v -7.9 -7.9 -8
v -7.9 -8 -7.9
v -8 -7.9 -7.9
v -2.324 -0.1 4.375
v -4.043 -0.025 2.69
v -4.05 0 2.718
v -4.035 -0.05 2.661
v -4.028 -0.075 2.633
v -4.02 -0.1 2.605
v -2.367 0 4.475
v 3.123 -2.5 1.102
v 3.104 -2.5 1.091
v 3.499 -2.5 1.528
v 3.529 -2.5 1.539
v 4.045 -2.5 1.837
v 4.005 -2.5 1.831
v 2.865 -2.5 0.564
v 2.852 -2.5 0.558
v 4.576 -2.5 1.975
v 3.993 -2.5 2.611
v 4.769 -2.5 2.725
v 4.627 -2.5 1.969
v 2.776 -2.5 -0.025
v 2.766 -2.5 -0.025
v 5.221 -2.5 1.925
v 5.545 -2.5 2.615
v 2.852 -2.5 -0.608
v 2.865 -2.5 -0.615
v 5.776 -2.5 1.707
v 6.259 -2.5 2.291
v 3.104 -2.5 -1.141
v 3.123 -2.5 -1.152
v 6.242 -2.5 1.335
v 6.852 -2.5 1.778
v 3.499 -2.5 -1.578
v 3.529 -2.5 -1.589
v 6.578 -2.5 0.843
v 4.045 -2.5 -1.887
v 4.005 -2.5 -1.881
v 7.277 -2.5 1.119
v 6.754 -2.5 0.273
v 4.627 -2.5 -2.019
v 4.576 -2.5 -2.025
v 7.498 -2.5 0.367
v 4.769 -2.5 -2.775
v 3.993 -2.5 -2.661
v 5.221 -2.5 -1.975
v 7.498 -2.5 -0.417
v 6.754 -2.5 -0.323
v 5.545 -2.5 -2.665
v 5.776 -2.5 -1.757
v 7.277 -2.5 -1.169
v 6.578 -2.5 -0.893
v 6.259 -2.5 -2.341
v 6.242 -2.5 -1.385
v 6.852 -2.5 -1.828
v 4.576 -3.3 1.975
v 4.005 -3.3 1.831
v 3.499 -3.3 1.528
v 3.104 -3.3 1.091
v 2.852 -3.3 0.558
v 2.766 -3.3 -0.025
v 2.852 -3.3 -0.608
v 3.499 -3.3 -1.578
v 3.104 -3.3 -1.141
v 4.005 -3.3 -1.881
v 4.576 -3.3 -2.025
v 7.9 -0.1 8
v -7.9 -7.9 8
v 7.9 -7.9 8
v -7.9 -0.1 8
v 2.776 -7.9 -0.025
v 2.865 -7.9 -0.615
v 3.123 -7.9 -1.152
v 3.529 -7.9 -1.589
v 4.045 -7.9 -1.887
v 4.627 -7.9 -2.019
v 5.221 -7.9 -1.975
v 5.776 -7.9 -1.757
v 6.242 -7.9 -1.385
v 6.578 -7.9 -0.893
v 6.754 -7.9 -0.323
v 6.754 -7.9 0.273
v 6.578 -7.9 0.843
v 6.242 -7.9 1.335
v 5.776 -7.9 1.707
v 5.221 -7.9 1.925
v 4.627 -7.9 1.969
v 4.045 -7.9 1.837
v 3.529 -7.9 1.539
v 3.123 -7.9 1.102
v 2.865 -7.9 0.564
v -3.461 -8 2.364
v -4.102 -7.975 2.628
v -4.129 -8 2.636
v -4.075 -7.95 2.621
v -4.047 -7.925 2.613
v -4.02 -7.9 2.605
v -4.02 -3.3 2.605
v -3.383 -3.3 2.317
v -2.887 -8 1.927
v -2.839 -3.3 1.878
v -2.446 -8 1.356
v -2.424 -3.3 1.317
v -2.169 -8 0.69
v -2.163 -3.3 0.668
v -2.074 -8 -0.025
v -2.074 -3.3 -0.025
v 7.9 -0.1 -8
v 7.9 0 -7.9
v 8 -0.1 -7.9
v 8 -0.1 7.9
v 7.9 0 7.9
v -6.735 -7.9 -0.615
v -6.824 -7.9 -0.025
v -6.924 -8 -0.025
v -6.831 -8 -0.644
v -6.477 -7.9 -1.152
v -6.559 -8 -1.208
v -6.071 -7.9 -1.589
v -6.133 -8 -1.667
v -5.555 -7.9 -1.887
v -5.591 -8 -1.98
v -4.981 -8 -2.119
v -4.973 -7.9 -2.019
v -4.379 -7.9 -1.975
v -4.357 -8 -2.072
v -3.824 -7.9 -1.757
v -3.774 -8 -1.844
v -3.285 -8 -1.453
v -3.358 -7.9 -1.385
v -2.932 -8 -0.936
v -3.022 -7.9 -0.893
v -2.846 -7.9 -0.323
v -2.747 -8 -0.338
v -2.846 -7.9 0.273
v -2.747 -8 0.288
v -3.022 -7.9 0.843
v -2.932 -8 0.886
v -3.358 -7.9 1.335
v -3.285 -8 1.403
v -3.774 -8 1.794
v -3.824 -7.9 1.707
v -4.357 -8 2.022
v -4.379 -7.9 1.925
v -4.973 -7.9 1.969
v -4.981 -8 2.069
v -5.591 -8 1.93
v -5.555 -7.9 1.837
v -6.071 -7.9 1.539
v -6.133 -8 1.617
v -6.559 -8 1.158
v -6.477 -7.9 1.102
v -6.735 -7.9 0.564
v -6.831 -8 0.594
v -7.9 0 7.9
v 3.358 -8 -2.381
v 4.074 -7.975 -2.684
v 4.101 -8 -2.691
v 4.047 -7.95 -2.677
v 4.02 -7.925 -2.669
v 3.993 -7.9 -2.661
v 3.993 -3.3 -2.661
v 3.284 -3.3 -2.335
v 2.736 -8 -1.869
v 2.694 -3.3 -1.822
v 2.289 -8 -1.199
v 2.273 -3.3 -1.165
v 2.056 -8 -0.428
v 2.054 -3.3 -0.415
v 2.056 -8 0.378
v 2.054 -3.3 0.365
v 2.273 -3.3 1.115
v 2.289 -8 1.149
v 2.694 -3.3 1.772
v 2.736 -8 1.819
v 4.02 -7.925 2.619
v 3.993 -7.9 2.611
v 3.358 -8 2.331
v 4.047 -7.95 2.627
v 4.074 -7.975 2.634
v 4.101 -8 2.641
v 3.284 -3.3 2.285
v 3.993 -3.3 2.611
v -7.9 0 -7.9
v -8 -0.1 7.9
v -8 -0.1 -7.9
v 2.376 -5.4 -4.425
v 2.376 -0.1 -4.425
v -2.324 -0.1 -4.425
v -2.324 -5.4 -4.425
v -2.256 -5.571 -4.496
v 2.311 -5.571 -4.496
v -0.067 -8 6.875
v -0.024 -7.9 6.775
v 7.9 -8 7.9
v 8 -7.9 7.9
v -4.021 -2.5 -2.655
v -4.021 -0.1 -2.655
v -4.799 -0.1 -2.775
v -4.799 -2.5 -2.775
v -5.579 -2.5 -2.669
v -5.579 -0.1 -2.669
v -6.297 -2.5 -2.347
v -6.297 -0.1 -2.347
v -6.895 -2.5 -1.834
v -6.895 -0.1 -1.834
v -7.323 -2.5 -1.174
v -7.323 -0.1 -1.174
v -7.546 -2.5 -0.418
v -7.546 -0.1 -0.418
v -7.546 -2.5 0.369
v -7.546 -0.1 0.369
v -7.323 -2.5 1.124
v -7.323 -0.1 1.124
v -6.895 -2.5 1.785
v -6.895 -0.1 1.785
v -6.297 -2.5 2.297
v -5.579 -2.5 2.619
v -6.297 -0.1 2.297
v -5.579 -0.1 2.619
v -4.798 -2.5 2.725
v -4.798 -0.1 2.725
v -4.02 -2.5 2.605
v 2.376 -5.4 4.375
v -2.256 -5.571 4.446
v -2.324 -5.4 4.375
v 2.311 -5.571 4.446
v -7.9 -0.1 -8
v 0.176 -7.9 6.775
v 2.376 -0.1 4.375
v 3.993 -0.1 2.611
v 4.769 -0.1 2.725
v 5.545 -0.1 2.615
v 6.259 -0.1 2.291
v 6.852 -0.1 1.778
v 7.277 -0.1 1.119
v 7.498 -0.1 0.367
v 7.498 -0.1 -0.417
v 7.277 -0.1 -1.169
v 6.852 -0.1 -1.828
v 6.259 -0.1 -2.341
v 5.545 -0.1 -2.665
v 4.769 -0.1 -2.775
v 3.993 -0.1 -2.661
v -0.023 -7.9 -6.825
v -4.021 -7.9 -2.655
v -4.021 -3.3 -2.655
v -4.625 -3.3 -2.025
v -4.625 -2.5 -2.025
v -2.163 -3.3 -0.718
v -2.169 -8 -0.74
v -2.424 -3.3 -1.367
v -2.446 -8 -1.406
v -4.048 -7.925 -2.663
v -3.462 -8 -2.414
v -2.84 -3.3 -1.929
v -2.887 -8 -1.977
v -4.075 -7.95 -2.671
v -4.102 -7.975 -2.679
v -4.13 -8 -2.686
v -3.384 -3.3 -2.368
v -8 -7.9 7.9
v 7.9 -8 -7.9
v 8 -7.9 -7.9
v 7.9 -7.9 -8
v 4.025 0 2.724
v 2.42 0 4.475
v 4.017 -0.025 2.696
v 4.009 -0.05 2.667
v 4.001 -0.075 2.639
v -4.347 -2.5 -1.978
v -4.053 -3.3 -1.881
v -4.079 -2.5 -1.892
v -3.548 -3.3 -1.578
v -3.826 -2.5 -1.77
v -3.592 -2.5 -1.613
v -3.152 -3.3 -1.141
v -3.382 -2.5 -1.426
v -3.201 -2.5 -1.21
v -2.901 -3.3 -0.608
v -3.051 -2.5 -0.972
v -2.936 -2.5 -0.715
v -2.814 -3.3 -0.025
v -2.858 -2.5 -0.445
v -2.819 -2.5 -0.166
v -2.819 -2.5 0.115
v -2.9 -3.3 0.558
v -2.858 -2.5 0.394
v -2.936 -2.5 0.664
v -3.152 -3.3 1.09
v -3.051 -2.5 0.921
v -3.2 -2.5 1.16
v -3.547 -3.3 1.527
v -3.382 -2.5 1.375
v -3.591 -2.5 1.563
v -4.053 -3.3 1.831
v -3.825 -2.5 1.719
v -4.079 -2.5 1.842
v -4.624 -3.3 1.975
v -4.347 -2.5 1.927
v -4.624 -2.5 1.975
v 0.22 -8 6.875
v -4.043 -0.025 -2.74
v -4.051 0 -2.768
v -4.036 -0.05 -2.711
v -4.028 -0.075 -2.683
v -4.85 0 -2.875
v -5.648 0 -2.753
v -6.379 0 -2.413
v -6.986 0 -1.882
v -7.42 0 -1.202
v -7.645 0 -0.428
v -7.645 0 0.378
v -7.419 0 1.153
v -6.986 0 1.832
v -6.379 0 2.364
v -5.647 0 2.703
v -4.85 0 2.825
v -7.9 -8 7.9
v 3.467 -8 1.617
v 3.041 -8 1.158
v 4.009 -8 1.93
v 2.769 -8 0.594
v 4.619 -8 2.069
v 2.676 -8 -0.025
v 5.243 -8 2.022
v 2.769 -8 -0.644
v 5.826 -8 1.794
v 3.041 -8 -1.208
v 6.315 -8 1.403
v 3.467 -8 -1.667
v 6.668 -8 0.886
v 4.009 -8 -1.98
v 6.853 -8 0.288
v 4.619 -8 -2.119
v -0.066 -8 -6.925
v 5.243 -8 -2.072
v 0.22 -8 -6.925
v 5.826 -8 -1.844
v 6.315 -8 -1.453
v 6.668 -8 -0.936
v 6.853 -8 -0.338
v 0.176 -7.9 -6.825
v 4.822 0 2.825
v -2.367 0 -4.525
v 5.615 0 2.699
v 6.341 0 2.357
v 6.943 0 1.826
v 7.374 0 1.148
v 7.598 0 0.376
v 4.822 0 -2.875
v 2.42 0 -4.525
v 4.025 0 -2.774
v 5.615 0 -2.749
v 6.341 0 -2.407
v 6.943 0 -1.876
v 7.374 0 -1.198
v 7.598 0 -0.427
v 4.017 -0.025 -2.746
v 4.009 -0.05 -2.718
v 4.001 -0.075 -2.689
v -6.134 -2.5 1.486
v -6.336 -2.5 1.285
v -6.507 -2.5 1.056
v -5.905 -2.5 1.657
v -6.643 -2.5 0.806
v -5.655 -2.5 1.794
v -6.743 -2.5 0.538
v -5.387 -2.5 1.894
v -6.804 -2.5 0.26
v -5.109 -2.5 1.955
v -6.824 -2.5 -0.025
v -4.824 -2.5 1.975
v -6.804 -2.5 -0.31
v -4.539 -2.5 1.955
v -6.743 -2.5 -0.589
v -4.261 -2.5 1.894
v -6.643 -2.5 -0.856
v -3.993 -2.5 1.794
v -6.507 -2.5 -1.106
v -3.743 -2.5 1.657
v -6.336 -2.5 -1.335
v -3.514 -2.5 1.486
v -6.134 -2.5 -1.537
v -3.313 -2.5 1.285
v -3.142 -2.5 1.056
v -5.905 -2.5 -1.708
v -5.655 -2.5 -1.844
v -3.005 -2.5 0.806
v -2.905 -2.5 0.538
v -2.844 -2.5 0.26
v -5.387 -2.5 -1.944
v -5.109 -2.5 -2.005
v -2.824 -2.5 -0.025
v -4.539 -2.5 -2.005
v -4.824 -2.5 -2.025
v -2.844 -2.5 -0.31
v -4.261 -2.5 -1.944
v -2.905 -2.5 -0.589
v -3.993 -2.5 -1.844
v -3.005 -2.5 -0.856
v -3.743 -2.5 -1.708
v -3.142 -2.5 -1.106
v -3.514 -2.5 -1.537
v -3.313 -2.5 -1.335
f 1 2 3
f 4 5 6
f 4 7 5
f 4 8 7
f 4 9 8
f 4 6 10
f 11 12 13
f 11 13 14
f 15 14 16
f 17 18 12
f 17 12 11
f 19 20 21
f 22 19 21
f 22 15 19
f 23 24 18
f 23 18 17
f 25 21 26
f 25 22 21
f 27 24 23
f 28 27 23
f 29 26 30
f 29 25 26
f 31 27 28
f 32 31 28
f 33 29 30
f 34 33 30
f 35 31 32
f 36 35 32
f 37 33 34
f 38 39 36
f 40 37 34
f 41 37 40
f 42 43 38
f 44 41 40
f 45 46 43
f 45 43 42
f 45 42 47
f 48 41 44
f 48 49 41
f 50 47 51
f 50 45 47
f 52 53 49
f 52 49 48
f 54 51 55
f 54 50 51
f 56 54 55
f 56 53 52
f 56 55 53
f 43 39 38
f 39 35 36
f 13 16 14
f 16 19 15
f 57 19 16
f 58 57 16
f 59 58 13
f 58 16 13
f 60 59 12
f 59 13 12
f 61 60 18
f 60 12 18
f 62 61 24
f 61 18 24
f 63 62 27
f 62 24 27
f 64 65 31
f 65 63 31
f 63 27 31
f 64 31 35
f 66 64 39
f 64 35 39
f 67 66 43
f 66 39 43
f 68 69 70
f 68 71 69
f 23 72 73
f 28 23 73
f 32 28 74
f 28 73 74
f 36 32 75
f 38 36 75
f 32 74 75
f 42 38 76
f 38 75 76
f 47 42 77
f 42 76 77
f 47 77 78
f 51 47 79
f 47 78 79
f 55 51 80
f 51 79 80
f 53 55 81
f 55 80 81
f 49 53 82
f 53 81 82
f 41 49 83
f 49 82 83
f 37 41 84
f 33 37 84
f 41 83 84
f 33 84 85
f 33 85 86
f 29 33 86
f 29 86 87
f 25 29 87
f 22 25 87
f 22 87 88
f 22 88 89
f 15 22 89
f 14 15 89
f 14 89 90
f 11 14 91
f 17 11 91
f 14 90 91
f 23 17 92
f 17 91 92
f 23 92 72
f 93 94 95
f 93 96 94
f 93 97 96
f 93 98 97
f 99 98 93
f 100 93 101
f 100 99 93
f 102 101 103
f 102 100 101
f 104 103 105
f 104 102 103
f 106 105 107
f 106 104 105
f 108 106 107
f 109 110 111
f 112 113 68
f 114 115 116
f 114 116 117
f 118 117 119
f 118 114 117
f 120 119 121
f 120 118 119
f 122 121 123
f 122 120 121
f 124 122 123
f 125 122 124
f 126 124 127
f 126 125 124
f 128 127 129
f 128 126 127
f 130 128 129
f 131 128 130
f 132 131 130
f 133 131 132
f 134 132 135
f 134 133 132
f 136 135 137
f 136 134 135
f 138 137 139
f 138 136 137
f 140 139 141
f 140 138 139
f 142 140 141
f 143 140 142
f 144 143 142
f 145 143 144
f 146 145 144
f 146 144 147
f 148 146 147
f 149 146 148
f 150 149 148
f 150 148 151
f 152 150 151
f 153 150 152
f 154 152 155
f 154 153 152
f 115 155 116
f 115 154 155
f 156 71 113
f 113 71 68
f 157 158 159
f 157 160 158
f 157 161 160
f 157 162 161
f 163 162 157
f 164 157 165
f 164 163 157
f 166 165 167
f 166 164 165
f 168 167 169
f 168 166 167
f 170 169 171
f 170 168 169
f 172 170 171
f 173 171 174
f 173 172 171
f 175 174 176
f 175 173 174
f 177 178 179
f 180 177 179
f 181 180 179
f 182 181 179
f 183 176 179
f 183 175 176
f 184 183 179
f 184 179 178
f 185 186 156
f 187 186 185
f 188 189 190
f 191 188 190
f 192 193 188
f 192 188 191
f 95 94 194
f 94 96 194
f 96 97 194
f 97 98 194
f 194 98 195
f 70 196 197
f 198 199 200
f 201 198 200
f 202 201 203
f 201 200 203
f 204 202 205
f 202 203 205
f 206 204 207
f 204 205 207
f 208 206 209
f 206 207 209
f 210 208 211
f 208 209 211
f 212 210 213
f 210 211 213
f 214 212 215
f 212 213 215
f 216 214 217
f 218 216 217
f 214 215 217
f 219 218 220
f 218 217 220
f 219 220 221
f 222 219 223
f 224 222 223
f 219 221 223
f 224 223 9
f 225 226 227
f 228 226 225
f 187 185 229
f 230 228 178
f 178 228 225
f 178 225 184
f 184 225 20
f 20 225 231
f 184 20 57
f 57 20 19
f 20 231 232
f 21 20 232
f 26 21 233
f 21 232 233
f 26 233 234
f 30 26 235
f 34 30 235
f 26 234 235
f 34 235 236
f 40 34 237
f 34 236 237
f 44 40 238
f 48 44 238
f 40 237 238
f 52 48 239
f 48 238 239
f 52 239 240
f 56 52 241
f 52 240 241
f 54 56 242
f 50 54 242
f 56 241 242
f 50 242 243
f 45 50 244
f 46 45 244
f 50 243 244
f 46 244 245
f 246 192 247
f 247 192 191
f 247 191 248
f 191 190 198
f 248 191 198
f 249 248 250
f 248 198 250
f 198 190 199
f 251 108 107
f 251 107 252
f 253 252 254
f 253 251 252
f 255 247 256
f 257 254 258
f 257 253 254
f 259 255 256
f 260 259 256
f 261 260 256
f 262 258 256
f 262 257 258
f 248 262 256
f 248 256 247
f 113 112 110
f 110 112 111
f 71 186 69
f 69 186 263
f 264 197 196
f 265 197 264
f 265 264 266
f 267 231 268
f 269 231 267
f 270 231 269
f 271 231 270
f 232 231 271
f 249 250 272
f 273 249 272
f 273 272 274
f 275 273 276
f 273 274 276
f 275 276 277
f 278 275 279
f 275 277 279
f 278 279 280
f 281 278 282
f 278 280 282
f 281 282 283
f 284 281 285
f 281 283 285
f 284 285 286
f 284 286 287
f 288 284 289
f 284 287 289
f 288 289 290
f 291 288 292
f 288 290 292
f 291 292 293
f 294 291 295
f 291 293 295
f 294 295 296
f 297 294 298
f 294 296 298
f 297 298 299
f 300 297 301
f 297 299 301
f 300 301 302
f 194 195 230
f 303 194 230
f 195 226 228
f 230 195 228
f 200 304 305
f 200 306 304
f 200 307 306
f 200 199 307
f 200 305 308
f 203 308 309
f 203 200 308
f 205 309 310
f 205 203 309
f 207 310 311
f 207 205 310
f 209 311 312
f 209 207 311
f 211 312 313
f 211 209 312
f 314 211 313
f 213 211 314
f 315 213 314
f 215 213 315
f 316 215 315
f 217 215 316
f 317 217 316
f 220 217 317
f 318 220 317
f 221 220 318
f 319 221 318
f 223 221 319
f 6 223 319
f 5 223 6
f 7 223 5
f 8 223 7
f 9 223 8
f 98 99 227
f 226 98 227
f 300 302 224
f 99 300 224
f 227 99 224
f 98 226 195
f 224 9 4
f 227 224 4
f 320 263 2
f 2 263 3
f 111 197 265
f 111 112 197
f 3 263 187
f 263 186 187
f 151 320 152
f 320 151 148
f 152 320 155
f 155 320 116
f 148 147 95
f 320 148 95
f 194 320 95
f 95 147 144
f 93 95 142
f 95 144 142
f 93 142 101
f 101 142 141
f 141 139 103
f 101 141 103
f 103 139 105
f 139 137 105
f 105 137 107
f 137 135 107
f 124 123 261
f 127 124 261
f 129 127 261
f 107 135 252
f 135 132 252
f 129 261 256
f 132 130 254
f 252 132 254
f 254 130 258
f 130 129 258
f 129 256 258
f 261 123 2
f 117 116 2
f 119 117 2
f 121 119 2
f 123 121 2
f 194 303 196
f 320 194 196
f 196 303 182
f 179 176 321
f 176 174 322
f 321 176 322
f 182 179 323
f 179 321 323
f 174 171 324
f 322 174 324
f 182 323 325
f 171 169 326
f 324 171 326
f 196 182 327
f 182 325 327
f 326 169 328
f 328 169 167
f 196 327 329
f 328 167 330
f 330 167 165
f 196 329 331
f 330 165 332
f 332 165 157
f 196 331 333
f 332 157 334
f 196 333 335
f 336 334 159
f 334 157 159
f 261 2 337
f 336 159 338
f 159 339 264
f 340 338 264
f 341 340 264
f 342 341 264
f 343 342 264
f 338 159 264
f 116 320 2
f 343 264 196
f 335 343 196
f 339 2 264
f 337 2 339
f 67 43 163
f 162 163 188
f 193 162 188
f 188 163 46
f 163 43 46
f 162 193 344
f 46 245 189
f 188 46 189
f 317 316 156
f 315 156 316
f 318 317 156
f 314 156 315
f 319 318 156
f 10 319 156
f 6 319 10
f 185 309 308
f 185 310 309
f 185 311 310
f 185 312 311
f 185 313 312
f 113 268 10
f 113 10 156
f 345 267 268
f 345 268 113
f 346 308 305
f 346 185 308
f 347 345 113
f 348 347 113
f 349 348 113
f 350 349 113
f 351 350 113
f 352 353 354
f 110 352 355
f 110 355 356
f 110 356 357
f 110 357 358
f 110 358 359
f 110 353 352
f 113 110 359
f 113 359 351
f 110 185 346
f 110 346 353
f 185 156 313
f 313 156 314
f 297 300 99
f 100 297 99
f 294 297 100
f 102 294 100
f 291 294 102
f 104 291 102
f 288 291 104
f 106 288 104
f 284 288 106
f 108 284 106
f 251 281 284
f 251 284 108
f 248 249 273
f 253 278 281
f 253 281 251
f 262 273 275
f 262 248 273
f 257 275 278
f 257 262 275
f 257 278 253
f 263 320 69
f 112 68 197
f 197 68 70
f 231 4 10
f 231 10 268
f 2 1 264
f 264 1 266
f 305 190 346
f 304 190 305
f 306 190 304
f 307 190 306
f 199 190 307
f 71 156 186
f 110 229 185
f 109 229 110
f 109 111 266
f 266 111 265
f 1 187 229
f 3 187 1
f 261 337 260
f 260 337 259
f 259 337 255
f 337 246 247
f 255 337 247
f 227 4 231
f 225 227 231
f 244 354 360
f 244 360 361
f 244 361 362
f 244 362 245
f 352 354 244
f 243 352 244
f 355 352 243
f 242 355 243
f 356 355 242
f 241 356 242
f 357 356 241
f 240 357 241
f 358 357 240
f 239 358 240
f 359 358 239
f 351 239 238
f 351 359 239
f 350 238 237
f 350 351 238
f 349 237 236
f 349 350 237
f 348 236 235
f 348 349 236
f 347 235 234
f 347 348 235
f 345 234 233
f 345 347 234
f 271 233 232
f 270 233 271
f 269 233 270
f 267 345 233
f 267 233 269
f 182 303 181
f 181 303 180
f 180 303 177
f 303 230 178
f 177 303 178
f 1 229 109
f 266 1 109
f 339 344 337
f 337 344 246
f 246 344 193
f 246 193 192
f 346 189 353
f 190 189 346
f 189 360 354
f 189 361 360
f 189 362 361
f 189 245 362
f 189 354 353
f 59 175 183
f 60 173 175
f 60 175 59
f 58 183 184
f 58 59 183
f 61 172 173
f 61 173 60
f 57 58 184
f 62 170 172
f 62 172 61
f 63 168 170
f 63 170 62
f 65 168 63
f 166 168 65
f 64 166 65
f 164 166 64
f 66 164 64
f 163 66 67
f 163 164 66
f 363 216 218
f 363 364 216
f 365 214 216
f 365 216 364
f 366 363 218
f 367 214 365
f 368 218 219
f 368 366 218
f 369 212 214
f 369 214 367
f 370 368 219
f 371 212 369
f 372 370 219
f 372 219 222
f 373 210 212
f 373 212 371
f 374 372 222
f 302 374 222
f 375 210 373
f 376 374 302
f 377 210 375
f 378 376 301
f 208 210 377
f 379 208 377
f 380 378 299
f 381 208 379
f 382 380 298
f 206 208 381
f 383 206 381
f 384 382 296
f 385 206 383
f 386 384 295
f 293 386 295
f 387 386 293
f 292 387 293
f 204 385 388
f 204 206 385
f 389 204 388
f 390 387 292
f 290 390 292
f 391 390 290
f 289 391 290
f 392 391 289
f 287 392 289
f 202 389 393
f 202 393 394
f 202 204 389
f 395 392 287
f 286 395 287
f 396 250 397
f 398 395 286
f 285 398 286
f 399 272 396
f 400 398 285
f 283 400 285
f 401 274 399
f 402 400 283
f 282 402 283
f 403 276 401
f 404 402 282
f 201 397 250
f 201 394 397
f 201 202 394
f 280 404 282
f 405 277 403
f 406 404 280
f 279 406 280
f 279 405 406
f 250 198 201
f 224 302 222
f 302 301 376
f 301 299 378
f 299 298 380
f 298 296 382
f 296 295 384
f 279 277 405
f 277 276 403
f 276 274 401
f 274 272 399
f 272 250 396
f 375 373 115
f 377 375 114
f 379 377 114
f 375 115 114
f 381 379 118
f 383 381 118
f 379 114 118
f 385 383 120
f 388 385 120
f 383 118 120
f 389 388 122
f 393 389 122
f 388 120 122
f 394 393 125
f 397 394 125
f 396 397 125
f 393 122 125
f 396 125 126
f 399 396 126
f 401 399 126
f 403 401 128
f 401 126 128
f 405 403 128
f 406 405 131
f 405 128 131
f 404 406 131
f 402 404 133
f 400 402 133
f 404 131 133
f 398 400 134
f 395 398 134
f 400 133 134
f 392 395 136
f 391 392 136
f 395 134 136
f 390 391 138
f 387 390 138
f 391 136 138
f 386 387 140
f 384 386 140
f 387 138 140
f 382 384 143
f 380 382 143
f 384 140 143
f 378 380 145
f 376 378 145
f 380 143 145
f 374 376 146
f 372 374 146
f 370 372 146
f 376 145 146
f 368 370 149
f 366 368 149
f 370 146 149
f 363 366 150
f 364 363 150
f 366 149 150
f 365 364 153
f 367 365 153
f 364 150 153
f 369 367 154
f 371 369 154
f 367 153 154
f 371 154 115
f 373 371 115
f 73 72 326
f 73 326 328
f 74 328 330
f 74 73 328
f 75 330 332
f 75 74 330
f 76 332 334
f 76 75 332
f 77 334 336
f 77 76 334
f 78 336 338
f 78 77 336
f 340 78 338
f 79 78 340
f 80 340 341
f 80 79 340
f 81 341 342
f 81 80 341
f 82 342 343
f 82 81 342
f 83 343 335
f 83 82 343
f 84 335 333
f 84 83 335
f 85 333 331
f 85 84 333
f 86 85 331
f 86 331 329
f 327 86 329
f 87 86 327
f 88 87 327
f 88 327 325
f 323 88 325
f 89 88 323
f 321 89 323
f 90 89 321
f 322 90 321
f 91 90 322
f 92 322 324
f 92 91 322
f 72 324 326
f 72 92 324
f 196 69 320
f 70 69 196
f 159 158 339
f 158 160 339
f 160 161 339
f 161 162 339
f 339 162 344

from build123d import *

# Parameters (mm, degrees)
SKETCH1_W                      = 16
SKETCH1_H                      = 16
BOSS_EXTRUDE1_DEPTH            = 8
BOSS_EXTRUDE2_START            = -3.3
BOSS_EXTRUDE2_DEPTH            = 4.7
CBORE_FOR_M3_SHCS1_D           = 4
CBORE_FOR_M3_SHCS1_CBORE_D     = 5.5
CBORE_FOR_M3_SHCS1_CBORE_DEPTH = 2.5
WIRECLEARANCE_SIZE             = 2.5
EDGEBREAK_0_1_SIZE             = 0.1


with BuildPart() as part:
    # Sketch1 → Boss-Extrude1 (new body)
    with BuildSketch(Plane(origin=(0, 0, 0), x_dir=(1, 0, 0), z_dir=(0, 1, 0))):
        Rectangle(SKETCH1_W, SKETCH1_H)
        with BuildLine():
            Line((-4.624026974, -1.974939831), (-2.324025974, -4.374940831))
            Line((-2.324025974, -4.374940831), (2.375974026, -4.374940831))
            Line((2.375974026, -4.374940831), (4.575973243, -1.974939653))
            ThreePointArc((4.575973243, -1.974939653), (2.765999996, 0.025060065), (4.575975026, 2.025058169))
            Line((4.575975026, 2.025058169), (2.375974026, 4.425059169))
            Line((2.375974026, 4.425059169), (-2.324025974, 4.425059169))
            Line((-2.324025974, 4.425059169), (-4.624764746, 2.025131808))
            ThreePointArc((-4.624764746, 2.025131808), (-2.814051979, 0.025429887), (-4.624026974, -1.974939831))
        make_face(mode=Mode.SUBTRACT)
    extrude(amount=-BOSS_EXTRUDE1_DEPTH)

    # Sketch2 → Boss-Extrude2 (add)
    with BuildSketch(Plane(origin=(0, 0, 0), x_dir=(1, 0, 0), z_dir=(0, 1, 0)).offset(BOSS_EXTRUDE2_START)):
        with BuildLine():
            ThreePointArc((3.992847908, -2.611076921), (6.420495716, -2.179038926), (7.525974026, 0.025059169))
            ThreePointArc((7.525974026, 0.025059169), (6.420496186, 2.229156913), (3.992849032, 2.661195592))
            Line((3.992849032, 2.661195592), (4.575975026, 2.025058169))
            ThreePointArc((4.575975026, 2.025058169), (2.765999996, 0.025060065), (4.575973243, -1.974939653))
            Line((4.575973243, -1.974939653), (3.992847908, -2.611076921))
        make_face()
        with BuildLine():
            Line((4.575975026, 2.025058169), (3.992849032, 2.661195592))
            ThreePointArc((3.992849032, 2.661195592), (2.025974026, 0.025059755), (3.992847908, -2.611076921))
            Line((3.992847908, -2.611076921), (4.575973243, -1.974939653))
            ThreePointArc((4.575973243, -1.974939653), (2.765999996, 0.025060065), (4.575975026, 2.025058169))
        make_face()
        with BuildLine():
            ThreePointArc((-4.020334349, -2.604879951), (-2.613522415, -1.610842422), (-2.074025974, 0.025059169))
            ThreePointArc((-2.074025974, 0.025059169), (-2.61366584, 1.661154545), (-4.020795486, 2.655139164))
            Line((-4.020795486, 2.655139164), (-4.624764746, 2.025131808))
            ThreePointArc((-4.624764746, 2.025131808), (-2.814051979, 0.025429887), (-4.624026974, -1.974939831))
            Line((-4.624026974, -1.974939831), (-4.020334349, -2.604879951))
        make_face()
        with BuildLine():
            Line((-4.624764746, 2.025131808), (-4.020795486, 2.655139164))
            ThreePointArc((-4.020795486, 2.655139164), (-7.574025963, 0.024818081), (-4.020334349, -2.604879951))
            Line((-4.020334349, -2.604879951), (-4.624026974, -1.974939831))
            ThreePointArc((-4.624026974, -1.974939831), (-2.814051979, 0.025429887), (-4.624764746, 2.025131808))
        make_face()
    extrude(amount=-BOSS_EXTRUDE2_DEPTH)

    # CBORE for M3 SHCS1 (through all)
    with Locations(Plane(origin=(0, 0, 0), x_dir=(1, 0, 0), z_dir=(0, 1, 0))):
        with Locations((4.775974026, 0.025059169), (-4.824025974, 0.025059169)):
            CounterBoreHole(CBORE_FOR_M3_SHCS1_D / 2, CBORE_FOR_M3_SHCS1_CBORE_D / 2, CBORE_FOR_M3_SHCS1_CBORE_DEPTH)

    # WireClearance
    wireclearance_edges = [part.edges().sort_by_distance(p)[0] for p in [
        (0.025974026, -8, -4.425059169),
        (0.025974026, -8, 4.374940831),
    ]]
    chamfer(wireclearance_edges, length=WIRECLEARANCE_SIZE)

    # Edgebreak-0.1
    edgebreak_0_1_edges = [part.edges().sort_by_distance(p)[0] for p in [
        (-8, -8, 0),
        (0.025974026, -5.5, -4.425059169),
        (0.025974026, -5.5, 4.374940831),
        (0, -8, 8),
        (-1.974073017, -8, -4.790099166),
        (2.038578604, -8, 4.743008876),
        (0.025974026, 0, 4.374940831),
        (3.184410967, 0, 3.493008876),
        (0.025974026, 0, -4.425059169),
        (-3.17241073, 0, -3.540099167),
        (8, -8, 0),
        (2.038578152, -8, -4.793127381),
        (0, 0, 8),
        (-8, 0, 0),
        (0, 0, -8),
        (-1.974263473, -8, 4.739910391),
        (8, 0, 0),
        (0, -8, -8),
        (-3.172180161, 0, 3.489910391),
        (-7.574025963, 0, -0.024818081),
        (8, -4, 8),
        (-8, -4, 8),
        (-8, -4, -8),
        (8, -4, -8),
        (-2.824025974, -8, -0.025059169),
        (3.184411529, 0, -3.543127381),
        (7.525974026, 0, -0.025058583),
        (6.775974026, -8, -0.025059169),
    ]]
    chamfer(edgebreak_0_1_edges, length=EDGEBREAK_0_1_SIZE)


solid = part.part
